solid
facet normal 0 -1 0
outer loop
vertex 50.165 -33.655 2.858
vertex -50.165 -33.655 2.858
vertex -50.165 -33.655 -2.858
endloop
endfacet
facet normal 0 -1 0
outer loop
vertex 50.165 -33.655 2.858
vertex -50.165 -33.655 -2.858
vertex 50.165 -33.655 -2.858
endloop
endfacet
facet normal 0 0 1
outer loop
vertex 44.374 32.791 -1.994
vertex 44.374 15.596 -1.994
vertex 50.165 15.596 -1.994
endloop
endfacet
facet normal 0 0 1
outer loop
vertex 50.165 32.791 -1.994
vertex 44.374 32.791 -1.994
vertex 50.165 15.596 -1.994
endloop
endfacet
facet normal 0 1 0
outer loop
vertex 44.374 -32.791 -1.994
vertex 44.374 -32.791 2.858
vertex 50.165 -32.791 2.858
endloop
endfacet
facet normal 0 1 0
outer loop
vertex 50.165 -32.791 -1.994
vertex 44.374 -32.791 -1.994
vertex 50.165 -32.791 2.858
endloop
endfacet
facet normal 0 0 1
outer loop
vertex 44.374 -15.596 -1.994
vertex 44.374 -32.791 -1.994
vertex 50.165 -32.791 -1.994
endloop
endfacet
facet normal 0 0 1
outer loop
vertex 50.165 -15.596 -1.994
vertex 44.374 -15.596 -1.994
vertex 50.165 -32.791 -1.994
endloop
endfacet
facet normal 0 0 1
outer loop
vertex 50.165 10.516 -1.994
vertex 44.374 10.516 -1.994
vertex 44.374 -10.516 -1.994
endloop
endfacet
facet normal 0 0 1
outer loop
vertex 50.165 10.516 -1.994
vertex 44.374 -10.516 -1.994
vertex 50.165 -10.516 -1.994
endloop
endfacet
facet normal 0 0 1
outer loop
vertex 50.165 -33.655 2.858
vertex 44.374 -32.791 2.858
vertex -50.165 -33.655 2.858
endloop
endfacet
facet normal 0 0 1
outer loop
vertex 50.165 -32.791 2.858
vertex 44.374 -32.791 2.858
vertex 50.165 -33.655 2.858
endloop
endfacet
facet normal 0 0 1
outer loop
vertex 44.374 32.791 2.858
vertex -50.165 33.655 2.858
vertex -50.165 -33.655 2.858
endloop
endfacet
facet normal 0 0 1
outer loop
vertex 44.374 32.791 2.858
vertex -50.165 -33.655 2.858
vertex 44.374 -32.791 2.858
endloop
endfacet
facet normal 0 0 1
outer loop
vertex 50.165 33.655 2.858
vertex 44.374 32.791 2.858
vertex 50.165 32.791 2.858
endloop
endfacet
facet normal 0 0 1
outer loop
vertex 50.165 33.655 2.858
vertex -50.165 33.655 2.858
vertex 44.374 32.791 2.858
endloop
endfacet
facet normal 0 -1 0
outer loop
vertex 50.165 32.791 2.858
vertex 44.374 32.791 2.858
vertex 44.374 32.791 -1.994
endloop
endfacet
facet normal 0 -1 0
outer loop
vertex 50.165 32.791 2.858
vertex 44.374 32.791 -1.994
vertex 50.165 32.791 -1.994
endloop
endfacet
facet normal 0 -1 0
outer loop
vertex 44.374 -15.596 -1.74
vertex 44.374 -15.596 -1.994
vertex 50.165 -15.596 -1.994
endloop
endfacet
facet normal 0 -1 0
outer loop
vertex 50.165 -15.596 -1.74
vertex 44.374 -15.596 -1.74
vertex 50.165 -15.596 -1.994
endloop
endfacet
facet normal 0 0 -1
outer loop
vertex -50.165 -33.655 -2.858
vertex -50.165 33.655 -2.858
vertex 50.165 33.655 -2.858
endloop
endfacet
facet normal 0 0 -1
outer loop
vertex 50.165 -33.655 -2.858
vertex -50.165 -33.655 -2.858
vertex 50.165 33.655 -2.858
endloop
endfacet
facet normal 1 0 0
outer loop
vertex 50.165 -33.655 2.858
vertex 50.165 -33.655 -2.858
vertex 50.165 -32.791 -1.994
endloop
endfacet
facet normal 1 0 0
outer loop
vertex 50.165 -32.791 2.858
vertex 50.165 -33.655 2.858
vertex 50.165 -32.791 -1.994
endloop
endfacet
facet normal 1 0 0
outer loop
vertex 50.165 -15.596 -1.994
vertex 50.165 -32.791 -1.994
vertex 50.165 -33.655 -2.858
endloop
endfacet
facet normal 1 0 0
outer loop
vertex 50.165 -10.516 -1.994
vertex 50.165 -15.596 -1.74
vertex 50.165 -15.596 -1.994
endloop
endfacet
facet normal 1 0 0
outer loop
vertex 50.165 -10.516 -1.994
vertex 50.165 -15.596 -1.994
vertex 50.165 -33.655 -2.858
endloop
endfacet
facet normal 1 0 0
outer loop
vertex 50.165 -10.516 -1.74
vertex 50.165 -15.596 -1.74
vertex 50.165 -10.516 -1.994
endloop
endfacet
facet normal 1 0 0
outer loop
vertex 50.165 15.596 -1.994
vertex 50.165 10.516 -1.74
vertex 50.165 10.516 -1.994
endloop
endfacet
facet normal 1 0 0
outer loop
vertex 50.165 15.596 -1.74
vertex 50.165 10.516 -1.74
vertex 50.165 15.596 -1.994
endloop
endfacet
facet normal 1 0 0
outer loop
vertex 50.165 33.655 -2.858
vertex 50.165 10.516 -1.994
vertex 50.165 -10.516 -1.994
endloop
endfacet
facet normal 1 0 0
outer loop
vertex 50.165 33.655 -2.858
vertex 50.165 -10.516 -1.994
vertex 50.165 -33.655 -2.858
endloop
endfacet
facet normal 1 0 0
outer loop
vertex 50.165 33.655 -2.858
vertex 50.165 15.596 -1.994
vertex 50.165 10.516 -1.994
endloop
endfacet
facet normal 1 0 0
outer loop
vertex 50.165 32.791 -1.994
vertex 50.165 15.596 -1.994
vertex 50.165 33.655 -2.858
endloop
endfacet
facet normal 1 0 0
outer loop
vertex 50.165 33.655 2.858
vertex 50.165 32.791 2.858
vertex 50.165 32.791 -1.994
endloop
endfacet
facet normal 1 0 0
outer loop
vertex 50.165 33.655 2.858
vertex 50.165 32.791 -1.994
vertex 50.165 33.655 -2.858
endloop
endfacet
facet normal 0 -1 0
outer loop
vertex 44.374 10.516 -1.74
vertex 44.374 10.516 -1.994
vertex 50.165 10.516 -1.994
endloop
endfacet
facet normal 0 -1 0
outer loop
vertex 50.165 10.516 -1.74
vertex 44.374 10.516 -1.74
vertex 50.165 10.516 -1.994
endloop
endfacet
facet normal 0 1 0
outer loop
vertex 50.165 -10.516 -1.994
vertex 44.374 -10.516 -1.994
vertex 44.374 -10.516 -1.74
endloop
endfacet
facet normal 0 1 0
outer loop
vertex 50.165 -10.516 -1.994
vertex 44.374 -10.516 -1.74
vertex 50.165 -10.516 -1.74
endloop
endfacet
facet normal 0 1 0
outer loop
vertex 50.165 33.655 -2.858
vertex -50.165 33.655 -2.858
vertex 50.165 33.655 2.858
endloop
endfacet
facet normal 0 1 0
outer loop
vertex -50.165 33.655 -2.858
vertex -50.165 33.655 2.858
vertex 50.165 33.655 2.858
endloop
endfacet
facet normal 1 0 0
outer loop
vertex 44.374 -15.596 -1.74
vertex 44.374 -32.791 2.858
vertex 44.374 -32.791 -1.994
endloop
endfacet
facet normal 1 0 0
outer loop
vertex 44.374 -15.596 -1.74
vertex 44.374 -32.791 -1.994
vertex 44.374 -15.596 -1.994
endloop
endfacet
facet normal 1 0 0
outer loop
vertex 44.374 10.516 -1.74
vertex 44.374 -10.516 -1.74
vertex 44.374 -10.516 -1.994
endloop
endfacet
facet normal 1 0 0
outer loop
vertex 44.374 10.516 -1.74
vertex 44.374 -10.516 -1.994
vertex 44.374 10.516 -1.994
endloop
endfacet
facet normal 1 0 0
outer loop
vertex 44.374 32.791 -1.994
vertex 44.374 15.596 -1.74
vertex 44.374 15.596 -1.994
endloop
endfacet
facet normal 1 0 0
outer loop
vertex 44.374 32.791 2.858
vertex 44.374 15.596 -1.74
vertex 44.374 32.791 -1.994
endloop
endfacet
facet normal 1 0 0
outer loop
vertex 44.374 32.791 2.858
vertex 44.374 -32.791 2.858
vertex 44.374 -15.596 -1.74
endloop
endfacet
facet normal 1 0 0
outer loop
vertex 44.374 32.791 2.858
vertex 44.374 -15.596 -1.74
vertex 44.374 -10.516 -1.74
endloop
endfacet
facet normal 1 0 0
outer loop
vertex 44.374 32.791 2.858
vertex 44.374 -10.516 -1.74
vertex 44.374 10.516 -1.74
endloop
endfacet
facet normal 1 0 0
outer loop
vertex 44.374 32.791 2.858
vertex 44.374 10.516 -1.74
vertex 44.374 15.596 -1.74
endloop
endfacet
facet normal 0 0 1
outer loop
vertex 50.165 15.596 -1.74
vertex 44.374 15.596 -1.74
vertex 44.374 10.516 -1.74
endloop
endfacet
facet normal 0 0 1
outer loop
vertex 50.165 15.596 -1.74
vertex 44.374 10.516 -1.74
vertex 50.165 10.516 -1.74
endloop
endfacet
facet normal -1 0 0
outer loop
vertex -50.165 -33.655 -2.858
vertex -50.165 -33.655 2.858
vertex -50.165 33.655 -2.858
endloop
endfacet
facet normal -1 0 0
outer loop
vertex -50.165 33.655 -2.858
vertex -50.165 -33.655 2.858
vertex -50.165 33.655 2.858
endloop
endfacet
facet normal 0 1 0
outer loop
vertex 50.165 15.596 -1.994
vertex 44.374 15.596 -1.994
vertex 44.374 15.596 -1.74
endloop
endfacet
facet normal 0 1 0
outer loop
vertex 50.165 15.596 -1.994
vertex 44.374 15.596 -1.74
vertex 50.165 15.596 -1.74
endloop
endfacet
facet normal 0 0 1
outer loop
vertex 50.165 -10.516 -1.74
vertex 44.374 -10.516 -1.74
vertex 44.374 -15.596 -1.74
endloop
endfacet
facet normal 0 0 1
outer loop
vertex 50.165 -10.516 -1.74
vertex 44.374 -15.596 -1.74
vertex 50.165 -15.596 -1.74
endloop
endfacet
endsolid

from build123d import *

# Parameters (mm, degrees)
SKETCH1_W           = 100.33
SKETCH1_H           = 67.31
BOSS_EXTRUDE1_DEPTH = 2.8575
SKETCH2_W           = 5.7912
SKETCH2_H           = 65.5828
CUT_EXTRUDE1_DEPTH  = 4.8514
SKETCH3_W           = 5.7912
SKETCH3_H           = 5.08
BOSS_EXTRUDE2_DEPTH = 0.254


with BuildPart() as part:
    # Sketch1 → Boss-Extrude1 (new, symmetric)
    with BuildSketch(Plane.XY):
        Rectangle(SKETCH1_W, SKETCH1_H)
    extrude(amount=BOSS_EXTRUDE1_DEPTH, both=True)

    # Sketch2 → Cut-Extrude1 (cut)
    with BuildSketch(Plane.XY.offset(2.8575)):
        with Locations((47.2694, 0)):
            Rectangle(SKETCH2_W, SKETCH2_H)
    extrude(amount=-CUT_EXTRUDE1_DEPTH, mode=Mode.SUBTRACT)

    # Sketch3 → Boss-Extrude2 (add)
    with BuildSketch(Plane.XY.offset(-1.9939)):
        with Locations((47.2694, -13.0556)):
            Rectangle(SKETCH3_W, SKETCH3_H)
        with Locations((47.2694, 13.0556)):
            Rectangle(SKETCH3_W, SKETCH3_H)
    extrude(amount=BOSS_EXTRUDE2_DEPTH)


solid = part.part
